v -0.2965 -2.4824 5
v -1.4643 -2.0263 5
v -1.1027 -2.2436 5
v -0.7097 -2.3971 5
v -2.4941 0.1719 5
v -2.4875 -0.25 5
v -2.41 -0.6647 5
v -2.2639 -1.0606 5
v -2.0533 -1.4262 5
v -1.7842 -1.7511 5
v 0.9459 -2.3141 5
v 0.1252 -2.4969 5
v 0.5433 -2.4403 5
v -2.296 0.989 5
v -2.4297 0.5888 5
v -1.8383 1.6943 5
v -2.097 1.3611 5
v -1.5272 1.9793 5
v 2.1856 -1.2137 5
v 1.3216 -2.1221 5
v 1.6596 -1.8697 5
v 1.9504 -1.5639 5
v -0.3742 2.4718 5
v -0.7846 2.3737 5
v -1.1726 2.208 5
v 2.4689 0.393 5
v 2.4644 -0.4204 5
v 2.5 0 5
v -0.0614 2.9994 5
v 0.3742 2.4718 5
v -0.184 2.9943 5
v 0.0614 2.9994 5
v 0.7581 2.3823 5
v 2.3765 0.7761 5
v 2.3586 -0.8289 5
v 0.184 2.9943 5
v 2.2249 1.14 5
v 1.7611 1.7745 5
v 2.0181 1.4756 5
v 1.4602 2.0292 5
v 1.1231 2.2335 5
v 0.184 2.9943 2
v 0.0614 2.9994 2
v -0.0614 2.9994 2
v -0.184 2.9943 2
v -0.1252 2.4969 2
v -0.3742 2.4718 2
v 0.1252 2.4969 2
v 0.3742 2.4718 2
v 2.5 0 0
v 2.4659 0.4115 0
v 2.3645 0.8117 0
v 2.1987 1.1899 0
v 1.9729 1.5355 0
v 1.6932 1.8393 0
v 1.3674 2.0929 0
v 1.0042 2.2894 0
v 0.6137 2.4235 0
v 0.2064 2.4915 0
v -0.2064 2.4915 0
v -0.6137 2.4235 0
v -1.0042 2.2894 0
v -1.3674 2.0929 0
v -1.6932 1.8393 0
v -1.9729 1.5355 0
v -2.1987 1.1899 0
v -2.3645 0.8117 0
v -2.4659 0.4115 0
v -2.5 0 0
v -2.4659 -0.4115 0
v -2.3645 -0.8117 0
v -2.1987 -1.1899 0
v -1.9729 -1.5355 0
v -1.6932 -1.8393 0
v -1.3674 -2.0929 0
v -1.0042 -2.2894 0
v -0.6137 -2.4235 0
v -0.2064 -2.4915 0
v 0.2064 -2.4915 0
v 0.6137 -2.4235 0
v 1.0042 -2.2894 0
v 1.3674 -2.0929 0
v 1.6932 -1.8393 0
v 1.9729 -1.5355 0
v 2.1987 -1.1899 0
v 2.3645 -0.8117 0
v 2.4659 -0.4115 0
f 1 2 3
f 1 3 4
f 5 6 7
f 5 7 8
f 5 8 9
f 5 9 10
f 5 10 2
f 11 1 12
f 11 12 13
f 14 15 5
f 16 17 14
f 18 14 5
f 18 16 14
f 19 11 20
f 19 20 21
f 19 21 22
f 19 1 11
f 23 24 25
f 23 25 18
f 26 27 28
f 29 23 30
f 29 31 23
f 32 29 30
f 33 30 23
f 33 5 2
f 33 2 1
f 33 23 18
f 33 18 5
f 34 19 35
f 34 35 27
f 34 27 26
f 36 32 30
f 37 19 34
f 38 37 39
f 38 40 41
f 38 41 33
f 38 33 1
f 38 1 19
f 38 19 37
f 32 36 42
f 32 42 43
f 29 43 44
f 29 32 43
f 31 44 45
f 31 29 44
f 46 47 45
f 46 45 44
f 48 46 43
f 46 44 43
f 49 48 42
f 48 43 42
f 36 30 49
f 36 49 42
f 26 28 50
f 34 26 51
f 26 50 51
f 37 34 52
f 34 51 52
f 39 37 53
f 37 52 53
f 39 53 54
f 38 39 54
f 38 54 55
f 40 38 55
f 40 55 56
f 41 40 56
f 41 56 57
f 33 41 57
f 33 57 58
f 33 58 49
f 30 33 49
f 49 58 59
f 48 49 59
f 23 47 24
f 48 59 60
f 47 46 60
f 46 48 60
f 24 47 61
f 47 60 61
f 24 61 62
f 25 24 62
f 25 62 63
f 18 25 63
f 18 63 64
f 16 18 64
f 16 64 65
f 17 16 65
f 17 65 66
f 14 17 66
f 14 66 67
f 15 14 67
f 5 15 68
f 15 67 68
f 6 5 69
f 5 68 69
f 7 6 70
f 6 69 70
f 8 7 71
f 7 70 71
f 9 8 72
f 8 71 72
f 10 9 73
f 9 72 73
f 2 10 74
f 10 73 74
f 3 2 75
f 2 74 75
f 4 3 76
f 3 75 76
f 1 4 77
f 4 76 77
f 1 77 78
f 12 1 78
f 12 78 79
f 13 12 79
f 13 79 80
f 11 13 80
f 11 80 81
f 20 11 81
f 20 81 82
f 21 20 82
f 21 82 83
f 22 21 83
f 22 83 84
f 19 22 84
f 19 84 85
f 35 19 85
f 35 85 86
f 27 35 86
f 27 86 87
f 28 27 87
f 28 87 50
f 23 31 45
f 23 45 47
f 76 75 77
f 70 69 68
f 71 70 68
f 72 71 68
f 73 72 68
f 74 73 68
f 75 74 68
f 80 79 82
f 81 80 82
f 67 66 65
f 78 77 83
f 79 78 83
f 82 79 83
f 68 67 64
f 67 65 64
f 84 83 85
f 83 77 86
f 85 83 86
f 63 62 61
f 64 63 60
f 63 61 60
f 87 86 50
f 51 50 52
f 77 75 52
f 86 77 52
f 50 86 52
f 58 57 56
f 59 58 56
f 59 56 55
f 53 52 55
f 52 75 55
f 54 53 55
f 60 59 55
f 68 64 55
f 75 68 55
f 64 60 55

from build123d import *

# Parameters (mm, degrees)
SKETCH_1_R      = 2.5
EXTRUDE_1_DEPTH = 5
EXTRUDE_2_DEPTH = 3


with BuildPart() as part:
    # 草图1 → 凸台-拉伸1 (new body)
    with BuildSketch(Plane.XY):
        Circle(SKETCH_1_R)
    extrude(amount=EXTRUDE_1_DEPTH)

    # 草图2 → 凸台-拉伸2 (add)
    with BuildSketch(Plane.XY.offset(5)):
        with BuildLine():
            Line((-0.184041749, 2.994349451), (-0.374222232, 2.471832867))
            ThreePointArc((-0.374222232, 2.471832867), (0, 2.5), (0.374222232, 2.471832867))
            Line((0.374222232, 2.471832867), (0.184041749, 2.994349451))
            ThreePointArc((0.184041749, 2.994349451), (0, 3), (-0.184041749, 2.994349451))
        make_face()
    extrude(amount=-EXTRUDE_2_DEPTH)


solid = part.part
